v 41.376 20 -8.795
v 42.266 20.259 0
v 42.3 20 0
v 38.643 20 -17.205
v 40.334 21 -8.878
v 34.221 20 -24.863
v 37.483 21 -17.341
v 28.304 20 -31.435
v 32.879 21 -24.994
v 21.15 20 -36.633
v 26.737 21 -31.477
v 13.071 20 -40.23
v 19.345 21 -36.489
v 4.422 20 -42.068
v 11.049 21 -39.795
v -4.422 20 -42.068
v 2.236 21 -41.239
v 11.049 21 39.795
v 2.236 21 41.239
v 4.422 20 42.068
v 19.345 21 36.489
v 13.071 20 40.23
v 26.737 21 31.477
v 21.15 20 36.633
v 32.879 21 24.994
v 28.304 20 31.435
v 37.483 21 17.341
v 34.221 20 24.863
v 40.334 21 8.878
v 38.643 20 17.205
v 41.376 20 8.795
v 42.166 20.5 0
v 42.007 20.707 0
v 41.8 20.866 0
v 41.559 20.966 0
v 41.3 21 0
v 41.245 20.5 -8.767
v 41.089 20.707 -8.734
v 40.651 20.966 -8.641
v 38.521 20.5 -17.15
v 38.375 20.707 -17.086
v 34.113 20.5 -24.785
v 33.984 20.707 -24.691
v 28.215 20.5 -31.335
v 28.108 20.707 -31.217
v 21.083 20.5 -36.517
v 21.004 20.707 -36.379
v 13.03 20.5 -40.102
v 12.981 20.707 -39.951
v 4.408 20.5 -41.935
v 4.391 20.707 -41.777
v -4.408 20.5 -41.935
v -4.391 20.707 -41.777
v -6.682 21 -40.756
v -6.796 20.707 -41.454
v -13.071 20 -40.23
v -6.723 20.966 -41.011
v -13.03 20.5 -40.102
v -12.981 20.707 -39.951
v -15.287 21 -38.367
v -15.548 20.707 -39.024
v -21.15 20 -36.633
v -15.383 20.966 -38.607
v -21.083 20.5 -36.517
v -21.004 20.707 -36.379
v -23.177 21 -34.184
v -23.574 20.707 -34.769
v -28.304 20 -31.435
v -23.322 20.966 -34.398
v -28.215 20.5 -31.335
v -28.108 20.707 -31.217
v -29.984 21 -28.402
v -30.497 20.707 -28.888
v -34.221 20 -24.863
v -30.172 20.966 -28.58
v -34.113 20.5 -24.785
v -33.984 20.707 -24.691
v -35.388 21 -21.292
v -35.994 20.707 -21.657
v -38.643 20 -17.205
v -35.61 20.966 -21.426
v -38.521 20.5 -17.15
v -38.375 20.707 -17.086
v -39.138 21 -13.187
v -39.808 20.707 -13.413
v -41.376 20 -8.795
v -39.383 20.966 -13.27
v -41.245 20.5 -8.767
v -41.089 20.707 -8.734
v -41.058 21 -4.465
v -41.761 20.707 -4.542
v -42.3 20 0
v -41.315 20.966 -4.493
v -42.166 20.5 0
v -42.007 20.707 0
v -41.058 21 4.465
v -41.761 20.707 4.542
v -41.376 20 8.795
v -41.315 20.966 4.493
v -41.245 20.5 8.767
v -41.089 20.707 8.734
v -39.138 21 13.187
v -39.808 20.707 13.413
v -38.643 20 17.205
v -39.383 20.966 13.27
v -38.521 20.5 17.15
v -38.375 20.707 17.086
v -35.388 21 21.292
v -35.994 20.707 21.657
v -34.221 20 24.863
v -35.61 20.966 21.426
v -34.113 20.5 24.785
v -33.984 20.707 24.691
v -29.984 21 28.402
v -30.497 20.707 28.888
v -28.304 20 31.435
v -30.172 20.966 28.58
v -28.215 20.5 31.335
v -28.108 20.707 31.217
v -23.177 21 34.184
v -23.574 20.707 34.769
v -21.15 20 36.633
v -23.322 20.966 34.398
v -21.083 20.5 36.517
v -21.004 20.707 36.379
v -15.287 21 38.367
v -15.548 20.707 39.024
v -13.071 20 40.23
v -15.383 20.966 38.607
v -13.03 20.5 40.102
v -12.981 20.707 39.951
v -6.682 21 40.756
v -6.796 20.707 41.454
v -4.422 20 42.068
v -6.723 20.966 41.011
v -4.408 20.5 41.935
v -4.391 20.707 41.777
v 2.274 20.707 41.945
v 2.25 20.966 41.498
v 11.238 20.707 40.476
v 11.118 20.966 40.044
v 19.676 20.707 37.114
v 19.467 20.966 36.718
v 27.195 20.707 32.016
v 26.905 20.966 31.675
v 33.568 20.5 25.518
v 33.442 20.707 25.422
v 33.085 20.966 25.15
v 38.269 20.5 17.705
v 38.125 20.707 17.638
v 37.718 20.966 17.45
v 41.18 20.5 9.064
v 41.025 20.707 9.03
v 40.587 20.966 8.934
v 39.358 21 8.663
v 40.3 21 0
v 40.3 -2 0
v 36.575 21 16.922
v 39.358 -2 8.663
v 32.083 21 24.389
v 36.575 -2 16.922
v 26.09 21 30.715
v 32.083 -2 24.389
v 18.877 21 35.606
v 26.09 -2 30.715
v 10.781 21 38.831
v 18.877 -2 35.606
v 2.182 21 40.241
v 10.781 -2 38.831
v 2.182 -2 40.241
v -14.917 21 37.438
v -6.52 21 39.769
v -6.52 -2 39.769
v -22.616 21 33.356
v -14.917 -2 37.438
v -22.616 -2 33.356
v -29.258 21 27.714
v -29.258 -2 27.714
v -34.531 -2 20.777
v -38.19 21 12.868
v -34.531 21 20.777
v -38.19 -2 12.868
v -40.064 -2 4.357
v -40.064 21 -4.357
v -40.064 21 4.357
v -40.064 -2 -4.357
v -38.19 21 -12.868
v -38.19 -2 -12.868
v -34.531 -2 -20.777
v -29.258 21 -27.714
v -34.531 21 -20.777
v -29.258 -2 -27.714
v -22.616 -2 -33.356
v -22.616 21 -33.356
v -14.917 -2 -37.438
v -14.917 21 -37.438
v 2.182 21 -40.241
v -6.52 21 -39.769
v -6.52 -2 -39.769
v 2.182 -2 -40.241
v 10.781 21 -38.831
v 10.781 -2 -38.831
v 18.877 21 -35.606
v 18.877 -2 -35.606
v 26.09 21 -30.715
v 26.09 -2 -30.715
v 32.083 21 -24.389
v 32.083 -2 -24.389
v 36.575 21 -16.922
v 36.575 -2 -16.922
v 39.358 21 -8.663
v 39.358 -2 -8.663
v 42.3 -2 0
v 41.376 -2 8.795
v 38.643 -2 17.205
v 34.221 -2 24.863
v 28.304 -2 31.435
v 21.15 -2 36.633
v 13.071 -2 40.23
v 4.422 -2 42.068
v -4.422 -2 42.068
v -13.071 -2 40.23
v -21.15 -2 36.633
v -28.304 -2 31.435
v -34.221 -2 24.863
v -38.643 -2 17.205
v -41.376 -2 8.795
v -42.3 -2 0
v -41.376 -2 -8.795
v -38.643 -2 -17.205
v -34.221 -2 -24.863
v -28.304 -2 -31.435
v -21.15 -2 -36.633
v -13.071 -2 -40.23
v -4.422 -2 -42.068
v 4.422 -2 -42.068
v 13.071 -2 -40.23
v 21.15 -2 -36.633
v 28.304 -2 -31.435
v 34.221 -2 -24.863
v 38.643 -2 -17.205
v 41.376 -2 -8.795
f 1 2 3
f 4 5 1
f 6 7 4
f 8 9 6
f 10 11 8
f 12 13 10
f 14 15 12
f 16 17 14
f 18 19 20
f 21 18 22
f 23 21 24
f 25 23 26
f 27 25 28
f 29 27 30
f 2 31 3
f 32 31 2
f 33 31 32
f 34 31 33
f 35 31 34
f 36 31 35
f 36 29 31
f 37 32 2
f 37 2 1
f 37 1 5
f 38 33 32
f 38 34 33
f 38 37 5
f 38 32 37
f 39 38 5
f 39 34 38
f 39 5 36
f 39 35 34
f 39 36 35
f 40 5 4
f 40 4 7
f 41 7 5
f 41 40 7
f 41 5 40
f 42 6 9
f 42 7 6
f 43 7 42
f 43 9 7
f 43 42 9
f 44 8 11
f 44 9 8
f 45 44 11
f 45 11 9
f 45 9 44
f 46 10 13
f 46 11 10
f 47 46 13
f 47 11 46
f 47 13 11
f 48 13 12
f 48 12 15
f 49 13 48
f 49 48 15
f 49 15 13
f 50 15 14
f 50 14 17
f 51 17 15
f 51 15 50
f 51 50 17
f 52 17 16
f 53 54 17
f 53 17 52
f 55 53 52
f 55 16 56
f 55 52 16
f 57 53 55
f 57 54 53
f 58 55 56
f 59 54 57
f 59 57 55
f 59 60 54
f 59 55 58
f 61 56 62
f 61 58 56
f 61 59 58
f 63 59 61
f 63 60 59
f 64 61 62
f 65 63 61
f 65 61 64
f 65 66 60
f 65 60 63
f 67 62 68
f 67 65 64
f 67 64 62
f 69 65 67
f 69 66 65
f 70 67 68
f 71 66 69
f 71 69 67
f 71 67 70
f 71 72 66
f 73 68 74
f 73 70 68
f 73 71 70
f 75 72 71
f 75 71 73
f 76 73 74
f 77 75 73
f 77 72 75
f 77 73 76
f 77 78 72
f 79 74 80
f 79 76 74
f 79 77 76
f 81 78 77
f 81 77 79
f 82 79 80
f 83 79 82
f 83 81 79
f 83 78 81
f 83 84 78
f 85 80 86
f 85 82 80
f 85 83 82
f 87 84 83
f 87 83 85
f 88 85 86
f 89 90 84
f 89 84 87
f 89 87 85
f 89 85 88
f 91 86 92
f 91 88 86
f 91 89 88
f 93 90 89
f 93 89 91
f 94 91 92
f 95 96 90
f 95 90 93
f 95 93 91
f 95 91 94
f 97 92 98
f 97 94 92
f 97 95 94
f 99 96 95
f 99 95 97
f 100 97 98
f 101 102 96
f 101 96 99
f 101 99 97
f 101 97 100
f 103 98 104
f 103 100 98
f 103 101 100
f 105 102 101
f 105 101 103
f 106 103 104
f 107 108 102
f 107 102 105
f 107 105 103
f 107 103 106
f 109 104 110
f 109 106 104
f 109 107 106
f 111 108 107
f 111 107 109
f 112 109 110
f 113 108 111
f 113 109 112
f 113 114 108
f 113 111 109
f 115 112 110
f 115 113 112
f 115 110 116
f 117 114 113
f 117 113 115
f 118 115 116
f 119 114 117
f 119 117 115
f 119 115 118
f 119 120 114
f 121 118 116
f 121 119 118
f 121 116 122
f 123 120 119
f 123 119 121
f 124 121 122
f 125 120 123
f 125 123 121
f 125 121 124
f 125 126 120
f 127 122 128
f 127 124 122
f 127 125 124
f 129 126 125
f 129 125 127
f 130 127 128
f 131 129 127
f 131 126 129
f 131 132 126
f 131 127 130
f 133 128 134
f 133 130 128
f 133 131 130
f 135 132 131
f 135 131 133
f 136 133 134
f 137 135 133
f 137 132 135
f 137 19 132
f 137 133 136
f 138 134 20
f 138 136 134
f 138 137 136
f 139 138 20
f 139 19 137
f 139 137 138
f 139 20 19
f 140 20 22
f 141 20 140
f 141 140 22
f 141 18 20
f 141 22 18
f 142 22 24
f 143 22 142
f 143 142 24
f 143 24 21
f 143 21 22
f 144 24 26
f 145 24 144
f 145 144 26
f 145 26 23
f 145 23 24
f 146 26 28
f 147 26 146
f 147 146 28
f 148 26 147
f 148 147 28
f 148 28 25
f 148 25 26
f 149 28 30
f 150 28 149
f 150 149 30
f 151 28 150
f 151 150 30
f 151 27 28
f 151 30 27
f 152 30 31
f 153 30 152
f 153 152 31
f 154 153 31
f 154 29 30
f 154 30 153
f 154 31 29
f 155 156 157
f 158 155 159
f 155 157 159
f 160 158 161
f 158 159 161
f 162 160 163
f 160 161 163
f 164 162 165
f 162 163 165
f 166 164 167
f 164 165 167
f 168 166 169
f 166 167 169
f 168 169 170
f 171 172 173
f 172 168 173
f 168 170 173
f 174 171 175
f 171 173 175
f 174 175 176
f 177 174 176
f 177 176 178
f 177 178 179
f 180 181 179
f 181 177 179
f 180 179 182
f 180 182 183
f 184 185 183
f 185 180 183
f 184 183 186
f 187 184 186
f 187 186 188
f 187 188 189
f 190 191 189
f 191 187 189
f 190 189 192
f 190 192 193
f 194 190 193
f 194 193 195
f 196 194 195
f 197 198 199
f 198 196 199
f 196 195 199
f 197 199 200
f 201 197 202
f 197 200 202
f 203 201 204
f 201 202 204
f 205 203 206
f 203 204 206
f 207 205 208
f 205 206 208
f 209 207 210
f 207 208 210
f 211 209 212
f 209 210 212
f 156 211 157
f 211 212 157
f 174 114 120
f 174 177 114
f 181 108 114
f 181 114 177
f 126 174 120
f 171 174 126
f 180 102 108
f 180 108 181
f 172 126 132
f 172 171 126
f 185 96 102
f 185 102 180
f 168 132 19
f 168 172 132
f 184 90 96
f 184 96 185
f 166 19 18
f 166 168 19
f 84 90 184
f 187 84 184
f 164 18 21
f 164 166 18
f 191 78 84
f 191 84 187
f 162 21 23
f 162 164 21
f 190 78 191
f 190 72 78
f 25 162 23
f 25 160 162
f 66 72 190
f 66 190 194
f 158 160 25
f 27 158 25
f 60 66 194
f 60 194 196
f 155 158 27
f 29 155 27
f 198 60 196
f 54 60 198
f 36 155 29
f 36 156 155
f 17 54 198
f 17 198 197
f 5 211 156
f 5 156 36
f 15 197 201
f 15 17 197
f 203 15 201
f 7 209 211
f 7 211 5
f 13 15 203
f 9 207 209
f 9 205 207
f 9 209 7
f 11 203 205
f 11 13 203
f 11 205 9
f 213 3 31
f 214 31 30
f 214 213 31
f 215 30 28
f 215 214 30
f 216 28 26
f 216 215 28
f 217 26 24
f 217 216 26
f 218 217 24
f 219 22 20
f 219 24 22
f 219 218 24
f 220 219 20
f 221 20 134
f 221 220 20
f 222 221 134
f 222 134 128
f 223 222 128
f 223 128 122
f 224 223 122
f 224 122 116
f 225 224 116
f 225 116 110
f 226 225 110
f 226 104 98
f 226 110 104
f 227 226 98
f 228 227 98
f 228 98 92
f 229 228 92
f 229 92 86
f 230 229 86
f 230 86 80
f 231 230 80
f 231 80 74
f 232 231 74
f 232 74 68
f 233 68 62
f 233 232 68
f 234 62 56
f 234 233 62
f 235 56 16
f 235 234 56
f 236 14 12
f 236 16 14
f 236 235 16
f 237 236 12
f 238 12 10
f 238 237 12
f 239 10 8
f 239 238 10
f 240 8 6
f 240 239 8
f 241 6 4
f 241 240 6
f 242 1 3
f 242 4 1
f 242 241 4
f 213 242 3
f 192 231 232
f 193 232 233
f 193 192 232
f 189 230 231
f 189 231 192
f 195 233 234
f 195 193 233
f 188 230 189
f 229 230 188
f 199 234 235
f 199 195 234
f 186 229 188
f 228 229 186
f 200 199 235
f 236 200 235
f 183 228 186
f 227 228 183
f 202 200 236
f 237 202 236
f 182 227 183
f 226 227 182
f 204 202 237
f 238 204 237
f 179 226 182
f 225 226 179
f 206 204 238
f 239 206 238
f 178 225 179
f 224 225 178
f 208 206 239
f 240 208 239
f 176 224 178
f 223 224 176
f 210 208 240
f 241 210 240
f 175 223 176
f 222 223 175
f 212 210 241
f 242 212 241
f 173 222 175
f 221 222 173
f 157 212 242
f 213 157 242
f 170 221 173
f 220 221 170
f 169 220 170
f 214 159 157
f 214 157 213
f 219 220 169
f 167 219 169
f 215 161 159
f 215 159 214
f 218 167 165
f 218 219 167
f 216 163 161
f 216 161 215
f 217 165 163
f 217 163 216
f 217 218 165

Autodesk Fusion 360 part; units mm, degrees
sketch "Sketch3" plane through (0, 0, 0) normal (0, 1, 0) x (1, 0, 0)
  circle A0 centre (0, 0) radius 40.3
  circle A1 centre (0, 0) radius 42.3
  line L0 (30, -20) -> (-30, -20)
  line L1 (-30, -20) -> (-30, 20)
  line L2 (-30, 20) -> (30, 20)
  line L3 (30, 20) -> (30, -20)
  line L4 (30, -20) -> (-30, 20) construction
  line L5 (-30, -20) -> (30, 20) construction
  dimension "d13" = 80.6
  dimension "d14" = 2
  dimension "d34" = 60
  dimension "d35" = 40
extrude "Extrude3" add sketch "Sketch3" along normal blind 21 contours A1
sketch "Sketch4" plane through (0, 0, 0) normal (0, 0, 1) x (1, 0, 0)
  line L0 (-49.5, 21) -> (-47.3, 21)
  line L1 (49.5, 21) -> (47.3, 21)
  line L2 (-47.3, 21) -> (-47.3, 25.1334)
  line L3 (47.3, 21) -> (47.3, 25.1334)
  line L4 (47.3, 27) -> (47.3, 25)
  arc A0 (47.3, 25) -> (-47.3, 25) centre (0, -131.3064) ccw
  line L5 (47.3, 21) -> (45.3, 21)
  line L6 (45.3, 21) -> (45.3, 25.5913)
  line L7 (-47.3, 21) -> (-45.3, 21)
  line L8 (-45.3, 21) -> (-45.3, 25.5913)
  arc A1 (0, 32) -> (-47.3, 25) centre (0, -131.3064) ccw
  line L9 (0, 32) -> (0, 34)
  arc A2 (45.4965, 27.5344) -> (-45.4965, 27.5344) centre (0, -129.3064) ccw
  arc A3 (-45.4965, 27.5344) -> (-47.3, 25.1334) centre (-44.8, 25.1334) ccw
  arc A4 (47.3, 25.1334) -> (45.4965, 27.5344) centre (44.8, 25.1334) ccw
  line L10 (0, 21) -> (-2.5, 21)
  line L11 (-2.5, 21) -> (-2.5, 31.9809)
  line L12 (0, 21) -> (0, 32)
  line L13 (-42, 21) -> (-39.8, 21)
  line L14 (42, 21) -> (39.8, 21)
  line L15 (39.8, 21) -> (39.8, 27.0759)
  line L16 (-39.8, 21) -> (-39.8, 27.0759)
  line L17 (-39.8, 21) -> (-37.8, 21)
  line L18 (-37.8, 21) -> (-37.8, 27.5651)
  line L19 (37.8, 21) -> (37.8, 27.5651)
  line L20 (37.8, 21) -> (39.8, 21)
  line L21 (-39.8, 27.0759) -> (-39.8, 29.0759)
  line L22 (39.8, 27.0759) -> (39.8, 29.0759)
  line L23 (-39.8, 27.0759) -> (0, 27.0759)
  line L24 (0, 27.0759) -> (0, 34)
  point P0 (-47.3, 27)
  dimension "d17" = 2.2
  dimension "d18" = 2.2
  dimension "d19" = 6
  dimension "d20" = 6
  dimension "d22" = 2
  dimension "d23" = 2
  dimension "d24" = 2
  dimension "d25" = 2
  dimension "d26" = 2
  dimension "d27" = 2.5
  dimension "d28" = 2.5
  dimension "d36" = 2.2
  dimension "d37" = 2.2
  dimension "d38" = 2
  dimension "d39" = 2
sketch "Sketch5" plane through (0, 0, 0) normal (0, -1, 0) x (1, 0, 0)
  circle A0 centre (0, 0) radius 40.3
  circle A1 centre (0, 0) radius 42.3
extrude "Extrude4" add sketch "Sketch5" along normal blind 2 contours A0 | A1
fillet "Fillet2" radius 1 1 edges at (-39.4374, 21, 15.2963)
sketch "Sketch6" plane through (0, -2, 0) normal (0, -1, 0) x (1, 0, 0)
  line L0 (20, 27.5) -> (-20, 27.5)
  line L1 (-20, 27.5) -> (-20, -27.5)
  line L2 (-20, -27.5) -> (20, -27.5)
  line L3 (20, -27.5) -> (20, 27.5)
  line L4 (20, 27.5) -> (-20, -27.5) construction
  line L5 (-20, 27.5) -> (20, -27.5) construction
  circle A0 centre (0, 0) radius 42.3
  dimension "d41" = 55
  dimension "d42" = 40
sketch "Sketch7" plane through (0, -2, 0) normal (0, -1, 0) x (1, 0, 0)
  circle A0 centre (0, 0) radius 42.3
sketch "Sketch8" plane through (0, -2, 0) normal (0, -1, 0) x (1, 0, 0)
  circle A0 centre (0, 0) radius 42.3
sketch "Sketch9" plane through (0, 0, 0) normal (0, 0, 1) x (1, 0, 0)
sketch "Sketch10" plane through (0, -2, 0) normal (0, -1, 0) x (1, 0, 0)
  circle A0 centre (0, 0) radius 42.3
  circle A1 centre (0, 0) radius 40.3
  dimension "d43" = -2
extrude "Extrude5" cut sketch "Sketch10" against normal blind 3 contours A1
sketch "Sketch11" plane through (0, 21, 0) normal (0, 1, 0) x (-1, 0, 0)
  circle A0 centre (0, 0) radius 40.3
  circle A1 centre (0, 0) radius 41.3
  line L0 (42, 0) -> (40.3, 0)
  line L1 (40.3, 0) -> (39.3, 0)
  circle A2 centre (0, 0) radius 39.3
  dimension "d46" = 1
extrude "Extrude6" [suppressed]
fillet "Fillet3" [suppressed]
equation "d17 = 2 mm + 0.2 mm"
equation "d18 = 2 mm + 0.2 mm"
equation "d36 = 2 mm + 0.2 mm"
equation "d37 = 2 mm + 0.2 mm"
